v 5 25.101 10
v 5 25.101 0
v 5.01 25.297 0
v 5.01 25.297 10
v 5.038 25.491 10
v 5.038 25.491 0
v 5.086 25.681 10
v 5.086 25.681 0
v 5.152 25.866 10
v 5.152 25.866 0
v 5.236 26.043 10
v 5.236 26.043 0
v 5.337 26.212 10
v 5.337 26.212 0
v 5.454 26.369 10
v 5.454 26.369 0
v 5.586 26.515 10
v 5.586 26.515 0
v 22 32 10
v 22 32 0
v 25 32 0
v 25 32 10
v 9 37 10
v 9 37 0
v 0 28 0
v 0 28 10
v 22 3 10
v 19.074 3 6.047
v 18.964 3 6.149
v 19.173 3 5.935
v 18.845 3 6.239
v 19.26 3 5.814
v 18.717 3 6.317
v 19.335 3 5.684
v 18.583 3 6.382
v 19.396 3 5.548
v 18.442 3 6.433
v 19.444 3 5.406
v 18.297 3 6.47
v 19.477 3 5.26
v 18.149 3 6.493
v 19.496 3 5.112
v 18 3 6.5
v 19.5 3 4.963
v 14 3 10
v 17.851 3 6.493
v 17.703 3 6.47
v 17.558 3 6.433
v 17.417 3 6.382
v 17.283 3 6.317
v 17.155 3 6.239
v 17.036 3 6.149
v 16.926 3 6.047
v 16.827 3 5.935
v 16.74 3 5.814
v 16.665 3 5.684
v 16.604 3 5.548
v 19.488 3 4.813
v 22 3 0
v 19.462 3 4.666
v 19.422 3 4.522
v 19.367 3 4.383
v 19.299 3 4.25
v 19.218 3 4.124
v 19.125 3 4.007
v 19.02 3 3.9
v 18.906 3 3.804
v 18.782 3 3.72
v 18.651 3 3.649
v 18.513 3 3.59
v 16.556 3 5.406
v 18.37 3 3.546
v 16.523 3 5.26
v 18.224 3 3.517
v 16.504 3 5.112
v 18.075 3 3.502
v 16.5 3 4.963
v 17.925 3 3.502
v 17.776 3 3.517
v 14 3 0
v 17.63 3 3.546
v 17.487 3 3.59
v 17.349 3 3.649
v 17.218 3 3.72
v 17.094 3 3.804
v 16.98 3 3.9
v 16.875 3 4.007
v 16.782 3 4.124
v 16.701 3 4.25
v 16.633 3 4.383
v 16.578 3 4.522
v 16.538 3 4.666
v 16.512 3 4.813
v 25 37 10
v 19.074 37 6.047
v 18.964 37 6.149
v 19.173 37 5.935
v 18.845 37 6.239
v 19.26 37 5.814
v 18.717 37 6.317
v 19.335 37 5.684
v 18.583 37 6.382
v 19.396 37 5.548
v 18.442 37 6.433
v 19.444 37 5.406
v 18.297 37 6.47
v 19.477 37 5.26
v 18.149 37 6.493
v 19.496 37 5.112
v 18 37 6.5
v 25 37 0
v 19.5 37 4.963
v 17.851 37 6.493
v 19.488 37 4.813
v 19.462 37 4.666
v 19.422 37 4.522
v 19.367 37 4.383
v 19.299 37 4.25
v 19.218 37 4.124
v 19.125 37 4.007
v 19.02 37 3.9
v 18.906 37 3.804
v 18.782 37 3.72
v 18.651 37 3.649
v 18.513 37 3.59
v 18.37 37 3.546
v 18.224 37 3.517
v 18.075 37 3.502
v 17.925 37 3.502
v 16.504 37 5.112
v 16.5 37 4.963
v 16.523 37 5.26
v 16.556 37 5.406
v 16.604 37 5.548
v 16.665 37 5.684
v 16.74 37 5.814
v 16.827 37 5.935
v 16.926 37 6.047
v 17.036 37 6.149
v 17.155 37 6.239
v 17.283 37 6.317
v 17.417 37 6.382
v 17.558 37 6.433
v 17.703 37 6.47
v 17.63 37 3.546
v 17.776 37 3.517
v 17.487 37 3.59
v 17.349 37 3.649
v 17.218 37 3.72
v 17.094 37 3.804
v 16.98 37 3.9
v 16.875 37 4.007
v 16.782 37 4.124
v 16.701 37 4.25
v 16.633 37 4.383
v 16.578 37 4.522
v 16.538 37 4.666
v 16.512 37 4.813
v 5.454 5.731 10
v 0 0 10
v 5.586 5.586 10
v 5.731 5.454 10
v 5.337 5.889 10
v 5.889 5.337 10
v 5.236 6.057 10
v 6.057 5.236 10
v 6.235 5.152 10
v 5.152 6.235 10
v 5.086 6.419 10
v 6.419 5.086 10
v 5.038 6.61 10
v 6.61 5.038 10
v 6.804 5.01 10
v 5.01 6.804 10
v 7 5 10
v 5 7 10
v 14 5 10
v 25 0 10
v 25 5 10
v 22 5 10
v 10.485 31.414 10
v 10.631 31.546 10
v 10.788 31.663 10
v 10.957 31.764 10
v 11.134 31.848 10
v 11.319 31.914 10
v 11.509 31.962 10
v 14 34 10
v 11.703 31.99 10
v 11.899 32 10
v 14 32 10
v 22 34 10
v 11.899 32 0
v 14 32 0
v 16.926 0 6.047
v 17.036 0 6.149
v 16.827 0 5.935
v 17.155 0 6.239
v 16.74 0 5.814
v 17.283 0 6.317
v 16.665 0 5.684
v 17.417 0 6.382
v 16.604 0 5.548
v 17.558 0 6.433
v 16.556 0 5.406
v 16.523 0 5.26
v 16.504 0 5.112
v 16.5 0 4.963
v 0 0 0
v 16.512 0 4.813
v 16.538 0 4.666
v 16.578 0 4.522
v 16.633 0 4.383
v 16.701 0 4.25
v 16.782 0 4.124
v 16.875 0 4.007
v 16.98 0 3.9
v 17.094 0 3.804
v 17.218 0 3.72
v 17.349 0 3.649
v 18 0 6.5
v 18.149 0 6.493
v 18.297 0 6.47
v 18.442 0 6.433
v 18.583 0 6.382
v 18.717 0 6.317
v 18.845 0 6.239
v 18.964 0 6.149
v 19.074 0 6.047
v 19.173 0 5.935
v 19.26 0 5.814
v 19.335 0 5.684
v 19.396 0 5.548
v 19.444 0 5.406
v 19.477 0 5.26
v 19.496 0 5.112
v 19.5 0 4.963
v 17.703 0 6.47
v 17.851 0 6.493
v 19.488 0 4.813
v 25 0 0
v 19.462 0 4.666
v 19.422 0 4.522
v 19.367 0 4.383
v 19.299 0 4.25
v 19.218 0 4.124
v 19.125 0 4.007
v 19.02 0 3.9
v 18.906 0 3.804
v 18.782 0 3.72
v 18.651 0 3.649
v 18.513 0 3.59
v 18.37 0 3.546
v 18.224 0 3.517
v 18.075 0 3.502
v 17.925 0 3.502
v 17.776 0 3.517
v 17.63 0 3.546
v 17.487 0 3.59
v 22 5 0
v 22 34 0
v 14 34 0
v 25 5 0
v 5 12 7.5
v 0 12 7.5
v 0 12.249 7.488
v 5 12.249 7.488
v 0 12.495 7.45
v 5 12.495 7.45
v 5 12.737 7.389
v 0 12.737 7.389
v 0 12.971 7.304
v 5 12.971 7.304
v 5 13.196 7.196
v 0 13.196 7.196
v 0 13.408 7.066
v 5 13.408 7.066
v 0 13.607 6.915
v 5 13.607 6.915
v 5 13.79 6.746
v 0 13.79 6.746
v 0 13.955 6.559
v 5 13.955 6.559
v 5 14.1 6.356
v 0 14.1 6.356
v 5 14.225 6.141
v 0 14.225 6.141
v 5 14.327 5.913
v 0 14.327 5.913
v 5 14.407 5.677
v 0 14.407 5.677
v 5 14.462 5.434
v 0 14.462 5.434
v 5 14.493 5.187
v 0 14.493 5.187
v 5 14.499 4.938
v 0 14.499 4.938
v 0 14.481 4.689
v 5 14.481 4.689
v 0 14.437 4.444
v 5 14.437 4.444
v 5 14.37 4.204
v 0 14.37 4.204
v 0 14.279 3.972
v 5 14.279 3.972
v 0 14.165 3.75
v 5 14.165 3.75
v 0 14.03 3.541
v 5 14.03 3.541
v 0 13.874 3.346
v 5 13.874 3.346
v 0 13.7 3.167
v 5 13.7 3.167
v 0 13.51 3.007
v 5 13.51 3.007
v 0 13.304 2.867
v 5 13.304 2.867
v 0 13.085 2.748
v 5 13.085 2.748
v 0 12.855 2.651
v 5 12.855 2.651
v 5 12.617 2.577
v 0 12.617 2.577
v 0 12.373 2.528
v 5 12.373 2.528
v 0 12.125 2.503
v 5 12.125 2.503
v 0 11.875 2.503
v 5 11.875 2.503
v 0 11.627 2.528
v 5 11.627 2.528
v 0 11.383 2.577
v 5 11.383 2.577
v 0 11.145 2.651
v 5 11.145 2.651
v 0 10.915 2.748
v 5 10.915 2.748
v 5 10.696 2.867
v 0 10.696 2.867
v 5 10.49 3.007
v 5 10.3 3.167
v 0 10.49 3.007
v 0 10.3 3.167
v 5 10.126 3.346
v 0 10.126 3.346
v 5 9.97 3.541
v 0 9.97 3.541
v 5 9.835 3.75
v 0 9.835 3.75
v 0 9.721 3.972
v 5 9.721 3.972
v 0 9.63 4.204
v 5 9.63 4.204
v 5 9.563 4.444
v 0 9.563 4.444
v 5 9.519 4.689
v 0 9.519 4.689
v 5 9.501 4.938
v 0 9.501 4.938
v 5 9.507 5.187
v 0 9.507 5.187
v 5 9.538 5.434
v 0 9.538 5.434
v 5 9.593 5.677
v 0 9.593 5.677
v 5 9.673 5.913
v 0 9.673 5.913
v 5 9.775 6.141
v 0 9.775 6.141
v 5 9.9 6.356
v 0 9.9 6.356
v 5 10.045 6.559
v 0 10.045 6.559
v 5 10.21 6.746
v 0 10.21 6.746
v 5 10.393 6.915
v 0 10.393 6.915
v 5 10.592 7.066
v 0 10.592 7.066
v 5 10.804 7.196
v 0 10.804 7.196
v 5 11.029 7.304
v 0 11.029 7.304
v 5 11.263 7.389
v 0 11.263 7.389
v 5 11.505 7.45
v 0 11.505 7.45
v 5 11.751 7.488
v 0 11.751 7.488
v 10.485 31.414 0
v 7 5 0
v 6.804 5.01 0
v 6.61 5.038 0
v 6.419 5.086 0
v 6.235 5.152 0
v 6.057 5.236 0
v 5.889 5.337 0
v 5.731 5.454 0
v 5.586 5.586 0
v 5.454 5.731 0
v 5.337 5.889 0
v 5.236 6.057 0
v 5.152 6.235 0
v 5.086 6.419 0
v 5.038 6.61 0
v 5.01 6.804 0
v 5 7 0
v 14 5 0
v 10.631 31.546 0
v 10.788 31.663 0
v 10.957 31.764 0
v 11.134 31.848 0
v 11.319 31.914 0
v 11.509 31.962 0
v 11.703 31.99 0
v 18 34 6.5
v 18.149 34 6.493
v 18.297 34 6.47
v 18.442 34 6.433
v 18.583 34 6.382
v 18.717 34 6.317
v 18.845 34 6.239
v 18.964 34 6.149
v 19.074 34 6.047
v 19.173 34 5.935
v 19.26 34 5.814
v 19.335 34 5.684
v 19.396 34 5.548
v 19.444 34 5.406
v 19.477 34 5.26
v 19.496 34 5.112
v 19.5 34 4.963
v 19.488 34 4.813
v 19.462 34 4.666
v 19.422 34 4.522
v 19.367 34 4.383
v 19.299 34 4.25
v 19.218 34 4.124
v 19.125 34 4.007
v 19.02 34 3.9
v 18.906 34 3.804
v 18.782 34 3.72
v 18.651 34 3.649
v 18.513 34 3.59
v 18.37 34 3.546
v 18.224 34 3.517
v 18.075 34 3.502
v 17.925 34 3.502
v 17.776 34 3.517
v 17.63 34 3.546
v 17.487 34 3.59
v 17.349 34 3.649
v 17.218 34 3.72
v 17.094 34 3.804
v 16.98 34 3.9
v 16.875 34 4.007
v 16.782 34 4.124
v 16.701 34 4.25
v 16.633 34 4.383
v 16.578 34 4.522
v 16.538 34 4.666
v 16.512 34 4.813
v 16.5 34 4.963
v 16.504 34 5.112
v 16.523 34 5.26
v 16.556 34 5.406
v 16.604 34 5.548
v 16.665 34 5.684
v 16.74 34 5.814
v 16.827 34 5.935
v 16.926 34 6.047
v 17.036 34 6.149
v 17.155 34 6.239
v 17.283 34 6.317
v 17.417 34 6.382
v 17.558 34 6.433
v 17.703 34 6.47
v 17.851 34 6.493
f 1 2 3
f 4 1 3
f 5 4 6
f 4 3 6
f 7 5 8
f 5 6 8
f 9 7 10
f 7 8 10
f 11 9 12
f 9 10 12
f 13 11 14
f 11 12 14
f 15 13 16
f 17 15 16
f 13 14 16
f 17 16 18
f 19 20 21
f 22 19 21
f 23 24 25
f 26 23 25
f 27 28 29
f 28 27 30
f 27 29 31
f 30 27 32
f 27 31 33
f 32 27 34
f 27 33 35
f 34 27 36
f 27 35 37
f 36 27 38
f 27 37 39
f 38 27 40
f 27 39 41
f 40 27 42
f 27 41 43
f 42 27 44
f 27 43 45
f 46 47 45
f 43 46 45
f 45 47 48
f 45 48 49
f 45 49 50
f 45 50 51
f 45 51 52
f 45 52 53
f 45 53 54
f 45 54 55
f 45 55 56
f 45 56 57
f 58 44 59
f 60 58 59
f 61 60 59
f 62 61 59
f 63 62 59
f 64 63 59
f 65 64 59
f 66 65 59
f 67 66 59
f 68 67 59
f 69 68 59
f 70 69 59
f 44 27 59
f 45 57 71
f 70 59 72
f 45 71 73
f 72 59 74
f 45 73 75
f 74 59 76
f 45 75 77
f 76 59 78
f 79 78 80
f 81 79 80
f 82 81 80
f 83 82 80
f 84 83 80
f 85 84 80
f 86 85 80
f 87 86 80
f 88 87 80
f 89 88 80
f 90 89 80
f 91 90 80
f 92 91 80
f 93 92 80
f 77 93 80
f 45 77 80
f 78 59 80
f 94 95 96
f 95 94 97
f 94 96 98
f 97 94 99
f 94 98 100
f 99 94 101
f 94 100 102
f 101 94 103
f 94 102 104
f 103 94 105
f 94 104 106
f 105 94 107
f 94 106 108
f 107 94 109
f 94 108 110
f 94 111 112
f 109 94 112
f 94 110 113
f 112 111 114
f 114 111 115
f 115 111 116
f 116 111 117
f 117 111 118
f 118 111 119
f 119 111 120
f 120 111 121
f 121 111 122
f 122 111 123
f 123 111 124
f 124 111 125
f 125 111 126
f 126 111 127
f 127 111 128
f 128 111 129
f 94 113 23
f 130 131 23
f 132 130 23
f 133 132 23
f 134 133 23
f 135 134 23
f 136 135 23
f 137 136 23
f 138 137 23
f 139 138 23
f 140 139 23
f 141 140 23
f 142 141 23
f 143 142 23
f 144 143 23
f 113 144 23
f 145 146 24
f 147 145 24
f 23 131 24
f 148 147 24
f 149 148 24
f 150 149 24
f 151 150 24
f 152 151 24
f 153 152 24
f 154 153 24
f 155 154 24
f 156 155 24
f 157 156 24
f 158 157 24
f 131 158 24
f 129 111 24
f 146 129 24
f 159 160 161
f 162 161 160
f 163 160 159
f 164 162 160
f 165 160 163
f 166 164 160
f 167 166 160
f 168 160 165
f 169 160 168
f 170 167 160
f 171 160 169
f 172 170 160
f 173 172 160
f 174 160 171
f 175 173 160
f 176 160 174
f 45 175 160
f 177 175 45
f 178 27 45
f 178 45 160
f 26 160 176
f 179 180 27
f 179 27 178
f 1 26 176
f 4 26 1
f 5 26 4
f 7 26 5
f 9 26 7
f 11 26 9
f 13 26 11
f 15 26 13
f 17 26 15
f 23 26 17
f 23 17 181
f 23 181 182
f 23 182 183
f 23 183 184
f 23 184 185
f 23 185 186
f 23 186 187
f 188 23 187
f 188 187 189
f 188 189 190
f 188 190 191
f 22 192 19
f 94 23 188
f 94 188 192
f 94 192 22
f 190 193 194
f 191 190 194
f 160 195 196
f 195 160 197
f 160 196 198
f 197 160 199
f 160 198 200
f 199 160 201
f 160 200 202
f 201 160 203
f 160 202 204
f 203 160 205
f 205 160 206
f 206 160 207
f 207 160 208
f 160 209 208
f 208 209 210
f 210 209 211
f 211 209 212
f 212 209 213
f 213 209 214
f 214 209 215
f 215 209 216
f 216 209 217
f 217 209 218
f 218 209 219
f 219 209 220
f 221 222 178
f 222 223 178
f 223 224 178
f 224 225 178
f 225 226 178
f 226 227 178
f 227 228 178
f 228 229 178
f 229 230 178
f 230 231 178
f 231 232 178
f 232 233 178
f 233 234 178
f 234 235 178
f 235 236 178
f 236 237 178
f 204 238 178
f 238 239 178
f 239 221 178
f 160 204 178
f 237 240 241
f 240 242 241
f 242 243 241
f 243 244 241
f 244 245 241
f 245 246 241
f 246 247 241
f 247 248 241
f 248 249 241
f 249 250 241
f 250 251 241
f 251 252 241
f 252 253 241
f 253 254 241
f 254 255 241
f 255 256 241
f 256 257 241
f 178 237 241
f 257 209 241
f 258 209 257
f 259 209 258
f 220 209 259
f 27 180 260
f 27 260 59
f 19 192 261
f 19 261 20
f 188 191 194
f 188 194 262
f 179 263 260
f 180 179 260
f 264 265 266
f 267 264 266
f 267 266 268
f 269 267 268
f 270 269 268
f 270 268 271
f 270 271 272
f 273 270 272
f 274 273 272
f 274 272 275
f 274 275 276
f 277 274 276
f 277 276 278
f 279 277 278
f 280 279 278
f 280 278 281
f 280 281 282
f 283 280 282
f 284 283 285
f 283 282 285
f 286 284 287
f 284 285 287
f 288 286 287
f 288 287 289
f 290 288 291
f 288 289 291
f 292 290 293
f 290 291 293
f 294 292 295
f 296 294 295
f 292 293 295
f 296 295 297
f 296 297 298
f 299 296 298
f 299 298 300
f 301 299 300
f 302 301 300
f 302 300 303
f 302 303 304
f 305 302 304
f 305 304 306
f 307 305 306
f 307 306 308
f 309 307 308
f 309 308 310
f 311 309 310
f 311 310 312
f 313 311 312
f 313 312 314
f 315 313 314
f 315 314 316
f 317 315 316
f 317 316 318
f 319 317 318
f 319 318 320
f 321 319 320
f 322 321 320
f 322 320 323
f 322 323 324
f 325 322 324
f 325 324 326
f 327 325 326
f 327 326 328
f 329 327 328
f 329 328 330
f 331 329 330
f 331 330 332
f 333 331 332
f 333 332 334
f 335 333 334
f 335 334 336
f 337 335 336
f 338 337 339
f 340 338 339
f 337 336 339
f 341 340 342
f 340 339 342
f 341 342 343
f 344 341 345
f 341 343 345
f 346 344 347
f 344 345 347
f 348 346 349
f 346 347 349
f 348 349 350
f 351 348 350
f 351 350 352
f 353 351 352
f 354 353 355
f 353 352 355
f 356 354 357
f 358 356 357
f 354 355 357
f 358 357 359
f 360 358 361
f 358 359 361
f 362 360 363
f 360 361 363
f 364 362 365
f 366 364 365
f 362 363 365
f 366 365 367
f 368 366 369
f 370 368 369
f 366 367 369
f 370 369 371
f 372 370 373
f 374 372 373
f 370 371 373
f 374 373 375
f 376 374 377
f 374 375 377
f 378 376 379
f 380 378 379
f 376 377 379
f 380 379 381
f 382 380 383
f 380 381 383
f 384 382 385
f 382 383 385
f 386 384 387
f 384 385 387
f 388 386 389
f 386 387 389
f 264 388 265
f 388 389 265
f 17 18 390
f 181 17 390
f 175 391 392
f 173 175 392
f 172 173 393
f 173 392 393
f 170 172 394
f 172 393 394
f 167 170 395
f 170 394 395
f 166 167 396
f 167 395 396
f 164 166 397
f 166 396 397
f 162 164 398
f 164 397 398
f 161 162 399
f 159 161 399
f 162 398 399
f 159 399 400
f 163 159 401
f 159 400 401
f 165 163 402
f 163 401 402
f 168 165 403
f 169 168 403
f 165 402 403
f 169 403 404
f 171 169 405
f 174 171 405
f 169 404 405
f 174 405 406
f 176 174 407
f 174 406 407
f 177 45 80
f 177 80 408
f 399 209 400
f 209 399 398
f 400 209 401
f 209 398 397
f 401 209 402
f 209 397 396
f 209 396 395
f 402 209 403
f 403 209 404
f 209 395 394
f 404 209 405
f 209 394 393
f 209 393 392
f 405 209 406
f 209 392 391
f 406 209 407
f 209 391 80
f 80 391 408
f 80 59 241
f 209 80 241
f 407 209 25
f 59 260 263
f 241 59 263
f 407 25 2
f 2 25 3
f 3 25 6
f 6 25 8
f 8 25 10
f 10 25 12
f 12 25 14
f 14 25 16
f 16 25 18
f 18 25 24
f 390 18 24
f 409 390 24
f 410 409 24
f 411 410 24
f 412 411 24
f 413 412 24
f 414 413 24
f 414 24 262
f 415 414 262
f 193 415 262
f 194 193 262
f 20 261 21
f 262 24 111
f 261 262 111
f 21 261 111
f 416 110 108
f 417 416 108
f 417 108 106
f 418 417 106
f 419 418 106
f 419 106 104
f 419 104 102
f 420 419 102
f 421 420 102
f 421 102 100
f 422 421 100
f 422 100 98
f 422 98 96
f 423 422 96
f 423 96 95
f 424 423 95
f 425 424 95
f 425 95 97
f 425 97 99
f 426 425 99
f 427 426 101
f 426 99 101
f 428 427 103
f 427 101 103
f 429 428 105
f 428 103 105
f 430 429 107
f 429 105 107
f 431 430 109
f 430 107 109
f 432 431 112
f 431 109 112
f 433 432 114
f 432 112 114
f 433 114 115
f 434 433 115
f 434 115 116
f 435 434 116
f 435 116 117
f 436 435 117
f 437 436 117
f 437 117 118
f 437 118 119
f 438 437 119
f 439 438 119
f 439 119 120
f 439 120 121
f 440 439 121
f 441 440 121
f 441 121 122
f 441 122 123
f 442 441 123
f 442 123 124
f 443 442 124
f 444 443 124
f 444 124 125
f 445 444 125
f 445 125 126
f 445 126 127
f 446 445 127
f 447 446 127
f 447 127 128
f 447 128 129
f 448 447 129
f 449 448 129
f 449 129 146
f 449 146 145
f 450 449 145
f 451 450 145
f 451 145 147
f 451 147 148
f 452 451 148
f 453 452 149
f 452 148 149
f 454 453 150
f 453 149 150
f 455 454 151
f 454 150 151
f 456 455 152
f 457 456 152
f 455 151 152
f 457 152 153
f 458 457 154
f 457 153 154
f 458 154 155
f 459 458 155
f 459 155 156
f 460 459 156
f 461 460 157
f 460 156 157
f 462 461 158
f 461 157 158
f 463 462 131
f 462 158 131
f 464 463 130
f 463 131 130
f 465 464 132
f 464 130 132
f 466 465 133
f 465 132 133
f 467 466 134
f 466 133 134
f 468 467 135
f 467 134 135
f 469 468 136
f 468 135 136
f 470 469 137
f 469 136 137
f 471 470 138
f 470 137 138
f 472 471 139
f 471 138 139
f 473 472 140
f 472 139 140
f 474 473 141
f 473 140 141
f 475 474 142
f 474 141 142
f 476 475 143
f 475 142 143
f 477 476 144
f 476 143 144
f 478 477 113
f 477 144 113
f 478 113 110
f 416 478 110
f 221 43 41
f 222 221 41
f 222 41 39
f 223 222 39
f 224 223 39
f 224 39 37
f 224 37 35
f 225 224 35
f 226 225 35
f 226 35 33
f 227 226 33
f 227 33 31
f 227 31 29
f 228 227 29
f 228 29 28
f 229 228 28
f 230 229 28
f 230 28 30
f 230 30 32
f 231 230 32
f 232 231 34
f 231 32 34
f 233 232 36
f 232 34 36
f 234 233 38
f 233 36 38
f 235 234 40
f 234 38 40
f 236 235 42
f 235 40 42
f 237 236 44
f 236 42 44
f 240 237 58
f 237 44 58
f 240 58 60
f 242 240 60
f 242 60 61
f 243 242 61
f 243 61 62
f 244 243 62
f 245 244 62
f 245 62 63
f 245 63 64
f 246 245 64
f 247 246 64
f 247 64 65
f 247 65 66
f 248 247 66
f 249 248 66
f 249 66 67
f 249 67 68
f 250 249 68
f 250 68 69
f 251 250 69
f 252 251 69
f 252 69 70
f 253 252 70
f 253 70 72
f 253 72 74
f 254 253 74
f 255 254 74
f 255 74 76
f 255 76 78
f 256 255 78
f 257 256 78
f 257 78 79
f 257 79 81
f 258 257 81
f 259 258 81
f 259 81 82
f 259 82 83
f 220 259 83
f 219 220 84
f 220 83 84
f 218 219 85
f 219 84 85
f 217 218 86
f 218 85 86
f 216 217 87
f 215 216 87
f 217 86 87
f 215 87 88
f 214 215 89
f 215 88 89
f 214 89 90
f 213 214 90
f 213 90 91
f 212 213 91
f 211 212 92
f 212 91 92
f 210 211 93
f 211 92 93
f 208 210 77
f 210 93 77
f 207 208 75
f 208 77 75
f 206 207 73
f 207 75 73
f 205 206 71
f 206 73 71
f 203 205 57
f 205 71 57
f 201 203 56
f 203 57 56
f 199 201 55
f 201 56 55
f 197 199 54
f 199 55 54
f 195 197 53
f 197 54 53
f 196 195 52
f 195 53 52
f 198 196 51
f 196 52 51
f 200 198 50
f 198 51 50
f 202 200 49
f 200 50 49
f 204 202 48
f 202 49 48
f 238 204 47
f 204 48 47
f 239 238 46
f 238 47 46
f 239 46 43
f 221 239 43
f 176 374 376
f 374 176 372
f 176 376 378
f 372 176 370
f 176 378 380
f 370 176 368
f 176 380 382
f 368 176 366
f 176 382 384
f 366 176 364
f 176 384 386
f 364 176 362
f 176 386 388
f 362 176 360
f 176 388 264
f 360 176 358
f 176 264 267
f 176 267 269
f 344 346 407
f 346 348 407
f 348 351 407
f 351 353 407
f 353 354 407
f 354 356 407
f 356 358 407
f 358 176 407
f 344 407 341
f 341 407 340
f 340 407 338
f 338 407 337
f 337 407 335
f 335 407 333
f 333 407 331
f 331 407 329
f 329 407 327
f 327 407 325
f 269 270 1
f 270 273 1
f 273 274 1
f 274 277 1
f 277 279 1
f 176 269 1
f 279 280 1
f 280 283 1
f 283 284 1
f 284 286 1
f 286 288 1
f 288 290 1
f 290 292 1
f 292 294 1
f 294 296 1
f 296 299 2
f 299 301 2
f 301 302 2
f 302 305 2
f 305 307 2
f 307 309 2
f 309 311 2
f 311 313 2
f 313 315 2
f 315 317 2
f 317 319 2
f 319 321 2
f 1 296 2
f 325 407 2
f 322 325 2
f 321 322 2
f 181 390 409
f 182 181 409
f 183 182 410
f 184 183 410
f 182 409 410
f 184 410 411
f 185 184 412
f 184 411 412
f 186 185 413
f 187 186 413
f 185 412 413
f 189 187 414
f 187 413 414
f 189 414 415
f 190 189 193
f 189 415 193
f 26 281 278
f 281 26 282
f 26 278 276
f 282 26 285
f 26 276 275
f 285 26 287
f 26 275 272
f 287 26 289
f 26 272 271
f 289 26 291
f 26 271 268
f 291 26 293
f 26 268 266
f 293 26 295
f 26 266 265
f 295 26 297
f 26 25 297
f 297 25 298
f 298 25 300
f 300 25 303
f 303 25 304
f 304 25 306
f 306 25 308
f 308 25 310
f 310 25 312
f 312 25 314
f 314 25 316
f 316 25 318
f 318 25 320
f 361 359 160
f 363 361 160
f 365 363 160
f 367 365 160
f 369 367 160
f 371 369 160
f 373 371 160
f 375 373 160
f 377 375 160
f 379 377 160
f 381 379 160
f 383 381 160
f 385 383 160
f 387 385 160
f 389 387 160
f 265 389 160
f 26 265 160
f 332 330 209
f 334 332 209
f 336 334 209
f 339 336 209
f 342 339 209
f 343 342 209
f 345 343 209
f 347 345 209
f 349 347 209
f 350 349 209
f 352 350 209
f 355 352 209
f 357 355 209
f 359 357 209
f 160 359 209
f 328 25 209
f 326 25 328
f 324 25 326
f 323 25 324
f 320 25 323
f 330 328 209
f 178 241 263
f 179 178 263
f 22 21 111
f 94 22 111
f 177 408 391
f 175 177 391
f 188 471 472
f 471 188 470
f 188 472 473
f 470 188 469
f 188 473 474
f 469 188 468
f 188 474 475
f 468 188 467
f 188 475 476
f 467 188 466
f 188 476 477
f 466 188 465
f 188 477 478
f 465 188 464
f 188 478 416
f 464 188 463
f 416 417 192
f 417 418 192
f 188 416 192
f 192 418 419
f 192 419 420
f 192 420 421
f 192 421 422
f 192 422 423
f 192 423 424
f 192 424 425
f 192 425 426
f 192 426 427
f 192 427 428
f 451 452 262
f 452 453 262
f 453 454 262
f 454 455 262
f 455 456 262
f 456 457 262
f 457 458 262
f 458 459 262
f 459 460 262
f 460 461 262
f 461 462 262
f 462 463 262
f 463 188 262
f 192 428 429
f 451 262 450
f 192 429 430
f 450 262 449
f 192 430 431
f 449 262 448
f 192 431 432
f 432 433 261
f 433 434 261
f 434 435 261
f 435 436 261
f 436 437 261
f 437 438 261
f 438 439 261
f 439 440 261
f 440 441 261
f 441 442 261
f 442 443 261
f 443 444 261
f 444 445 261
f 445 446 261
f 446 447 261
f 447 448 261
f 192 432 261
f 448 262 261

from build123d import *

# Parameters (mm, degrees)
BOSS_EXTRUDE1_DEPTH = 10
SKETCH2_R           = 1.5
CUT_EXTRUDE1_DEPTH  = 38
CUT_EXTRUDE2_REACH  = 47.76
SKETCH3_R           = 2.5


with BuildPart() as part:
    # Sketch1 → Boss-Extrude1 (new body)
    with BuildSketch(Plane.XY):
        with BuildLine():
            Line((0, 0), (25, 0))
            Line((25, 0), (25, 5))
            Line((25, 5), (22, 5))
            Line((22, 5), (22, 3))
            Line((22, 3), (14, 3))
            Line((14, 3), (14, 5))
            Line((14, 5), (7, 5))
            ThreePointArc((7, 5), (5.585786438, 5.585786438), (5, 7))
            Line((5, 7), (5, 25.100505063))
            ThreePointArc((5, 25.100505063), (5.152240935, 25.865871928), (5.585786438, 26.514718626))
            Line((5.585786438, 26.514718626), (10.485281374, 31.414213562))
            ThreePointArc((10.485281374, 31.414213562), (11.134128072, 31.847759065), (11.899494937, 32))
            Line((11.899494937, 32), (14, 32))
            Line((14, 32), (14, 34))
            Line((14, 34), (22, 34))
            Line((22, 34), (22, 32))
            Line((22, 32), (25, 32))
            Line((25, 32), (25, 37))
            Line((25, 37), (9, 37))
            Line((9, 37), (0, 28))
            Line((0, 28), (0, 0))
        make_face()
    extrude(amount=BOSS_EXTRUDE1_DEPTH)

    # Sketch2 → Cut-Extrude1 (cut)
    with BuildSketch(Plane(origin=(0, 37, 0), x_dir=(1, 0, 0), z_dir=(0, 1, 0))):
        with Locations(Location((18, -5, 0), (0, 0, 270))):
            Circle(SKETCH2_R)
    extrude(amount=-CUT_EXTRUDE1_DEPTH, mode=Mode.SUBTRACT)

    # Sketch3 → Cut-Extrude2 (cut, up to next)
    with BuildSketch(Plane.ZY, mode=Mode.PRIVATE) as cut_extrude2_sk1:
        with Locations((5, 12)):
            Circle(SKETCH3_R)
    cut_extrude2_tool1 = extrude(cut_extrude2_sk1.sketch, amount=-CUT_EXTRUDE2_REACH, mode=Mode.PRIVATE) & part.part
    add(cut_extrude2_tool1.solids().sort_by_distance((0, 12, 5))[0], mode=Mode.SUBTRACT)


solid = part.part
